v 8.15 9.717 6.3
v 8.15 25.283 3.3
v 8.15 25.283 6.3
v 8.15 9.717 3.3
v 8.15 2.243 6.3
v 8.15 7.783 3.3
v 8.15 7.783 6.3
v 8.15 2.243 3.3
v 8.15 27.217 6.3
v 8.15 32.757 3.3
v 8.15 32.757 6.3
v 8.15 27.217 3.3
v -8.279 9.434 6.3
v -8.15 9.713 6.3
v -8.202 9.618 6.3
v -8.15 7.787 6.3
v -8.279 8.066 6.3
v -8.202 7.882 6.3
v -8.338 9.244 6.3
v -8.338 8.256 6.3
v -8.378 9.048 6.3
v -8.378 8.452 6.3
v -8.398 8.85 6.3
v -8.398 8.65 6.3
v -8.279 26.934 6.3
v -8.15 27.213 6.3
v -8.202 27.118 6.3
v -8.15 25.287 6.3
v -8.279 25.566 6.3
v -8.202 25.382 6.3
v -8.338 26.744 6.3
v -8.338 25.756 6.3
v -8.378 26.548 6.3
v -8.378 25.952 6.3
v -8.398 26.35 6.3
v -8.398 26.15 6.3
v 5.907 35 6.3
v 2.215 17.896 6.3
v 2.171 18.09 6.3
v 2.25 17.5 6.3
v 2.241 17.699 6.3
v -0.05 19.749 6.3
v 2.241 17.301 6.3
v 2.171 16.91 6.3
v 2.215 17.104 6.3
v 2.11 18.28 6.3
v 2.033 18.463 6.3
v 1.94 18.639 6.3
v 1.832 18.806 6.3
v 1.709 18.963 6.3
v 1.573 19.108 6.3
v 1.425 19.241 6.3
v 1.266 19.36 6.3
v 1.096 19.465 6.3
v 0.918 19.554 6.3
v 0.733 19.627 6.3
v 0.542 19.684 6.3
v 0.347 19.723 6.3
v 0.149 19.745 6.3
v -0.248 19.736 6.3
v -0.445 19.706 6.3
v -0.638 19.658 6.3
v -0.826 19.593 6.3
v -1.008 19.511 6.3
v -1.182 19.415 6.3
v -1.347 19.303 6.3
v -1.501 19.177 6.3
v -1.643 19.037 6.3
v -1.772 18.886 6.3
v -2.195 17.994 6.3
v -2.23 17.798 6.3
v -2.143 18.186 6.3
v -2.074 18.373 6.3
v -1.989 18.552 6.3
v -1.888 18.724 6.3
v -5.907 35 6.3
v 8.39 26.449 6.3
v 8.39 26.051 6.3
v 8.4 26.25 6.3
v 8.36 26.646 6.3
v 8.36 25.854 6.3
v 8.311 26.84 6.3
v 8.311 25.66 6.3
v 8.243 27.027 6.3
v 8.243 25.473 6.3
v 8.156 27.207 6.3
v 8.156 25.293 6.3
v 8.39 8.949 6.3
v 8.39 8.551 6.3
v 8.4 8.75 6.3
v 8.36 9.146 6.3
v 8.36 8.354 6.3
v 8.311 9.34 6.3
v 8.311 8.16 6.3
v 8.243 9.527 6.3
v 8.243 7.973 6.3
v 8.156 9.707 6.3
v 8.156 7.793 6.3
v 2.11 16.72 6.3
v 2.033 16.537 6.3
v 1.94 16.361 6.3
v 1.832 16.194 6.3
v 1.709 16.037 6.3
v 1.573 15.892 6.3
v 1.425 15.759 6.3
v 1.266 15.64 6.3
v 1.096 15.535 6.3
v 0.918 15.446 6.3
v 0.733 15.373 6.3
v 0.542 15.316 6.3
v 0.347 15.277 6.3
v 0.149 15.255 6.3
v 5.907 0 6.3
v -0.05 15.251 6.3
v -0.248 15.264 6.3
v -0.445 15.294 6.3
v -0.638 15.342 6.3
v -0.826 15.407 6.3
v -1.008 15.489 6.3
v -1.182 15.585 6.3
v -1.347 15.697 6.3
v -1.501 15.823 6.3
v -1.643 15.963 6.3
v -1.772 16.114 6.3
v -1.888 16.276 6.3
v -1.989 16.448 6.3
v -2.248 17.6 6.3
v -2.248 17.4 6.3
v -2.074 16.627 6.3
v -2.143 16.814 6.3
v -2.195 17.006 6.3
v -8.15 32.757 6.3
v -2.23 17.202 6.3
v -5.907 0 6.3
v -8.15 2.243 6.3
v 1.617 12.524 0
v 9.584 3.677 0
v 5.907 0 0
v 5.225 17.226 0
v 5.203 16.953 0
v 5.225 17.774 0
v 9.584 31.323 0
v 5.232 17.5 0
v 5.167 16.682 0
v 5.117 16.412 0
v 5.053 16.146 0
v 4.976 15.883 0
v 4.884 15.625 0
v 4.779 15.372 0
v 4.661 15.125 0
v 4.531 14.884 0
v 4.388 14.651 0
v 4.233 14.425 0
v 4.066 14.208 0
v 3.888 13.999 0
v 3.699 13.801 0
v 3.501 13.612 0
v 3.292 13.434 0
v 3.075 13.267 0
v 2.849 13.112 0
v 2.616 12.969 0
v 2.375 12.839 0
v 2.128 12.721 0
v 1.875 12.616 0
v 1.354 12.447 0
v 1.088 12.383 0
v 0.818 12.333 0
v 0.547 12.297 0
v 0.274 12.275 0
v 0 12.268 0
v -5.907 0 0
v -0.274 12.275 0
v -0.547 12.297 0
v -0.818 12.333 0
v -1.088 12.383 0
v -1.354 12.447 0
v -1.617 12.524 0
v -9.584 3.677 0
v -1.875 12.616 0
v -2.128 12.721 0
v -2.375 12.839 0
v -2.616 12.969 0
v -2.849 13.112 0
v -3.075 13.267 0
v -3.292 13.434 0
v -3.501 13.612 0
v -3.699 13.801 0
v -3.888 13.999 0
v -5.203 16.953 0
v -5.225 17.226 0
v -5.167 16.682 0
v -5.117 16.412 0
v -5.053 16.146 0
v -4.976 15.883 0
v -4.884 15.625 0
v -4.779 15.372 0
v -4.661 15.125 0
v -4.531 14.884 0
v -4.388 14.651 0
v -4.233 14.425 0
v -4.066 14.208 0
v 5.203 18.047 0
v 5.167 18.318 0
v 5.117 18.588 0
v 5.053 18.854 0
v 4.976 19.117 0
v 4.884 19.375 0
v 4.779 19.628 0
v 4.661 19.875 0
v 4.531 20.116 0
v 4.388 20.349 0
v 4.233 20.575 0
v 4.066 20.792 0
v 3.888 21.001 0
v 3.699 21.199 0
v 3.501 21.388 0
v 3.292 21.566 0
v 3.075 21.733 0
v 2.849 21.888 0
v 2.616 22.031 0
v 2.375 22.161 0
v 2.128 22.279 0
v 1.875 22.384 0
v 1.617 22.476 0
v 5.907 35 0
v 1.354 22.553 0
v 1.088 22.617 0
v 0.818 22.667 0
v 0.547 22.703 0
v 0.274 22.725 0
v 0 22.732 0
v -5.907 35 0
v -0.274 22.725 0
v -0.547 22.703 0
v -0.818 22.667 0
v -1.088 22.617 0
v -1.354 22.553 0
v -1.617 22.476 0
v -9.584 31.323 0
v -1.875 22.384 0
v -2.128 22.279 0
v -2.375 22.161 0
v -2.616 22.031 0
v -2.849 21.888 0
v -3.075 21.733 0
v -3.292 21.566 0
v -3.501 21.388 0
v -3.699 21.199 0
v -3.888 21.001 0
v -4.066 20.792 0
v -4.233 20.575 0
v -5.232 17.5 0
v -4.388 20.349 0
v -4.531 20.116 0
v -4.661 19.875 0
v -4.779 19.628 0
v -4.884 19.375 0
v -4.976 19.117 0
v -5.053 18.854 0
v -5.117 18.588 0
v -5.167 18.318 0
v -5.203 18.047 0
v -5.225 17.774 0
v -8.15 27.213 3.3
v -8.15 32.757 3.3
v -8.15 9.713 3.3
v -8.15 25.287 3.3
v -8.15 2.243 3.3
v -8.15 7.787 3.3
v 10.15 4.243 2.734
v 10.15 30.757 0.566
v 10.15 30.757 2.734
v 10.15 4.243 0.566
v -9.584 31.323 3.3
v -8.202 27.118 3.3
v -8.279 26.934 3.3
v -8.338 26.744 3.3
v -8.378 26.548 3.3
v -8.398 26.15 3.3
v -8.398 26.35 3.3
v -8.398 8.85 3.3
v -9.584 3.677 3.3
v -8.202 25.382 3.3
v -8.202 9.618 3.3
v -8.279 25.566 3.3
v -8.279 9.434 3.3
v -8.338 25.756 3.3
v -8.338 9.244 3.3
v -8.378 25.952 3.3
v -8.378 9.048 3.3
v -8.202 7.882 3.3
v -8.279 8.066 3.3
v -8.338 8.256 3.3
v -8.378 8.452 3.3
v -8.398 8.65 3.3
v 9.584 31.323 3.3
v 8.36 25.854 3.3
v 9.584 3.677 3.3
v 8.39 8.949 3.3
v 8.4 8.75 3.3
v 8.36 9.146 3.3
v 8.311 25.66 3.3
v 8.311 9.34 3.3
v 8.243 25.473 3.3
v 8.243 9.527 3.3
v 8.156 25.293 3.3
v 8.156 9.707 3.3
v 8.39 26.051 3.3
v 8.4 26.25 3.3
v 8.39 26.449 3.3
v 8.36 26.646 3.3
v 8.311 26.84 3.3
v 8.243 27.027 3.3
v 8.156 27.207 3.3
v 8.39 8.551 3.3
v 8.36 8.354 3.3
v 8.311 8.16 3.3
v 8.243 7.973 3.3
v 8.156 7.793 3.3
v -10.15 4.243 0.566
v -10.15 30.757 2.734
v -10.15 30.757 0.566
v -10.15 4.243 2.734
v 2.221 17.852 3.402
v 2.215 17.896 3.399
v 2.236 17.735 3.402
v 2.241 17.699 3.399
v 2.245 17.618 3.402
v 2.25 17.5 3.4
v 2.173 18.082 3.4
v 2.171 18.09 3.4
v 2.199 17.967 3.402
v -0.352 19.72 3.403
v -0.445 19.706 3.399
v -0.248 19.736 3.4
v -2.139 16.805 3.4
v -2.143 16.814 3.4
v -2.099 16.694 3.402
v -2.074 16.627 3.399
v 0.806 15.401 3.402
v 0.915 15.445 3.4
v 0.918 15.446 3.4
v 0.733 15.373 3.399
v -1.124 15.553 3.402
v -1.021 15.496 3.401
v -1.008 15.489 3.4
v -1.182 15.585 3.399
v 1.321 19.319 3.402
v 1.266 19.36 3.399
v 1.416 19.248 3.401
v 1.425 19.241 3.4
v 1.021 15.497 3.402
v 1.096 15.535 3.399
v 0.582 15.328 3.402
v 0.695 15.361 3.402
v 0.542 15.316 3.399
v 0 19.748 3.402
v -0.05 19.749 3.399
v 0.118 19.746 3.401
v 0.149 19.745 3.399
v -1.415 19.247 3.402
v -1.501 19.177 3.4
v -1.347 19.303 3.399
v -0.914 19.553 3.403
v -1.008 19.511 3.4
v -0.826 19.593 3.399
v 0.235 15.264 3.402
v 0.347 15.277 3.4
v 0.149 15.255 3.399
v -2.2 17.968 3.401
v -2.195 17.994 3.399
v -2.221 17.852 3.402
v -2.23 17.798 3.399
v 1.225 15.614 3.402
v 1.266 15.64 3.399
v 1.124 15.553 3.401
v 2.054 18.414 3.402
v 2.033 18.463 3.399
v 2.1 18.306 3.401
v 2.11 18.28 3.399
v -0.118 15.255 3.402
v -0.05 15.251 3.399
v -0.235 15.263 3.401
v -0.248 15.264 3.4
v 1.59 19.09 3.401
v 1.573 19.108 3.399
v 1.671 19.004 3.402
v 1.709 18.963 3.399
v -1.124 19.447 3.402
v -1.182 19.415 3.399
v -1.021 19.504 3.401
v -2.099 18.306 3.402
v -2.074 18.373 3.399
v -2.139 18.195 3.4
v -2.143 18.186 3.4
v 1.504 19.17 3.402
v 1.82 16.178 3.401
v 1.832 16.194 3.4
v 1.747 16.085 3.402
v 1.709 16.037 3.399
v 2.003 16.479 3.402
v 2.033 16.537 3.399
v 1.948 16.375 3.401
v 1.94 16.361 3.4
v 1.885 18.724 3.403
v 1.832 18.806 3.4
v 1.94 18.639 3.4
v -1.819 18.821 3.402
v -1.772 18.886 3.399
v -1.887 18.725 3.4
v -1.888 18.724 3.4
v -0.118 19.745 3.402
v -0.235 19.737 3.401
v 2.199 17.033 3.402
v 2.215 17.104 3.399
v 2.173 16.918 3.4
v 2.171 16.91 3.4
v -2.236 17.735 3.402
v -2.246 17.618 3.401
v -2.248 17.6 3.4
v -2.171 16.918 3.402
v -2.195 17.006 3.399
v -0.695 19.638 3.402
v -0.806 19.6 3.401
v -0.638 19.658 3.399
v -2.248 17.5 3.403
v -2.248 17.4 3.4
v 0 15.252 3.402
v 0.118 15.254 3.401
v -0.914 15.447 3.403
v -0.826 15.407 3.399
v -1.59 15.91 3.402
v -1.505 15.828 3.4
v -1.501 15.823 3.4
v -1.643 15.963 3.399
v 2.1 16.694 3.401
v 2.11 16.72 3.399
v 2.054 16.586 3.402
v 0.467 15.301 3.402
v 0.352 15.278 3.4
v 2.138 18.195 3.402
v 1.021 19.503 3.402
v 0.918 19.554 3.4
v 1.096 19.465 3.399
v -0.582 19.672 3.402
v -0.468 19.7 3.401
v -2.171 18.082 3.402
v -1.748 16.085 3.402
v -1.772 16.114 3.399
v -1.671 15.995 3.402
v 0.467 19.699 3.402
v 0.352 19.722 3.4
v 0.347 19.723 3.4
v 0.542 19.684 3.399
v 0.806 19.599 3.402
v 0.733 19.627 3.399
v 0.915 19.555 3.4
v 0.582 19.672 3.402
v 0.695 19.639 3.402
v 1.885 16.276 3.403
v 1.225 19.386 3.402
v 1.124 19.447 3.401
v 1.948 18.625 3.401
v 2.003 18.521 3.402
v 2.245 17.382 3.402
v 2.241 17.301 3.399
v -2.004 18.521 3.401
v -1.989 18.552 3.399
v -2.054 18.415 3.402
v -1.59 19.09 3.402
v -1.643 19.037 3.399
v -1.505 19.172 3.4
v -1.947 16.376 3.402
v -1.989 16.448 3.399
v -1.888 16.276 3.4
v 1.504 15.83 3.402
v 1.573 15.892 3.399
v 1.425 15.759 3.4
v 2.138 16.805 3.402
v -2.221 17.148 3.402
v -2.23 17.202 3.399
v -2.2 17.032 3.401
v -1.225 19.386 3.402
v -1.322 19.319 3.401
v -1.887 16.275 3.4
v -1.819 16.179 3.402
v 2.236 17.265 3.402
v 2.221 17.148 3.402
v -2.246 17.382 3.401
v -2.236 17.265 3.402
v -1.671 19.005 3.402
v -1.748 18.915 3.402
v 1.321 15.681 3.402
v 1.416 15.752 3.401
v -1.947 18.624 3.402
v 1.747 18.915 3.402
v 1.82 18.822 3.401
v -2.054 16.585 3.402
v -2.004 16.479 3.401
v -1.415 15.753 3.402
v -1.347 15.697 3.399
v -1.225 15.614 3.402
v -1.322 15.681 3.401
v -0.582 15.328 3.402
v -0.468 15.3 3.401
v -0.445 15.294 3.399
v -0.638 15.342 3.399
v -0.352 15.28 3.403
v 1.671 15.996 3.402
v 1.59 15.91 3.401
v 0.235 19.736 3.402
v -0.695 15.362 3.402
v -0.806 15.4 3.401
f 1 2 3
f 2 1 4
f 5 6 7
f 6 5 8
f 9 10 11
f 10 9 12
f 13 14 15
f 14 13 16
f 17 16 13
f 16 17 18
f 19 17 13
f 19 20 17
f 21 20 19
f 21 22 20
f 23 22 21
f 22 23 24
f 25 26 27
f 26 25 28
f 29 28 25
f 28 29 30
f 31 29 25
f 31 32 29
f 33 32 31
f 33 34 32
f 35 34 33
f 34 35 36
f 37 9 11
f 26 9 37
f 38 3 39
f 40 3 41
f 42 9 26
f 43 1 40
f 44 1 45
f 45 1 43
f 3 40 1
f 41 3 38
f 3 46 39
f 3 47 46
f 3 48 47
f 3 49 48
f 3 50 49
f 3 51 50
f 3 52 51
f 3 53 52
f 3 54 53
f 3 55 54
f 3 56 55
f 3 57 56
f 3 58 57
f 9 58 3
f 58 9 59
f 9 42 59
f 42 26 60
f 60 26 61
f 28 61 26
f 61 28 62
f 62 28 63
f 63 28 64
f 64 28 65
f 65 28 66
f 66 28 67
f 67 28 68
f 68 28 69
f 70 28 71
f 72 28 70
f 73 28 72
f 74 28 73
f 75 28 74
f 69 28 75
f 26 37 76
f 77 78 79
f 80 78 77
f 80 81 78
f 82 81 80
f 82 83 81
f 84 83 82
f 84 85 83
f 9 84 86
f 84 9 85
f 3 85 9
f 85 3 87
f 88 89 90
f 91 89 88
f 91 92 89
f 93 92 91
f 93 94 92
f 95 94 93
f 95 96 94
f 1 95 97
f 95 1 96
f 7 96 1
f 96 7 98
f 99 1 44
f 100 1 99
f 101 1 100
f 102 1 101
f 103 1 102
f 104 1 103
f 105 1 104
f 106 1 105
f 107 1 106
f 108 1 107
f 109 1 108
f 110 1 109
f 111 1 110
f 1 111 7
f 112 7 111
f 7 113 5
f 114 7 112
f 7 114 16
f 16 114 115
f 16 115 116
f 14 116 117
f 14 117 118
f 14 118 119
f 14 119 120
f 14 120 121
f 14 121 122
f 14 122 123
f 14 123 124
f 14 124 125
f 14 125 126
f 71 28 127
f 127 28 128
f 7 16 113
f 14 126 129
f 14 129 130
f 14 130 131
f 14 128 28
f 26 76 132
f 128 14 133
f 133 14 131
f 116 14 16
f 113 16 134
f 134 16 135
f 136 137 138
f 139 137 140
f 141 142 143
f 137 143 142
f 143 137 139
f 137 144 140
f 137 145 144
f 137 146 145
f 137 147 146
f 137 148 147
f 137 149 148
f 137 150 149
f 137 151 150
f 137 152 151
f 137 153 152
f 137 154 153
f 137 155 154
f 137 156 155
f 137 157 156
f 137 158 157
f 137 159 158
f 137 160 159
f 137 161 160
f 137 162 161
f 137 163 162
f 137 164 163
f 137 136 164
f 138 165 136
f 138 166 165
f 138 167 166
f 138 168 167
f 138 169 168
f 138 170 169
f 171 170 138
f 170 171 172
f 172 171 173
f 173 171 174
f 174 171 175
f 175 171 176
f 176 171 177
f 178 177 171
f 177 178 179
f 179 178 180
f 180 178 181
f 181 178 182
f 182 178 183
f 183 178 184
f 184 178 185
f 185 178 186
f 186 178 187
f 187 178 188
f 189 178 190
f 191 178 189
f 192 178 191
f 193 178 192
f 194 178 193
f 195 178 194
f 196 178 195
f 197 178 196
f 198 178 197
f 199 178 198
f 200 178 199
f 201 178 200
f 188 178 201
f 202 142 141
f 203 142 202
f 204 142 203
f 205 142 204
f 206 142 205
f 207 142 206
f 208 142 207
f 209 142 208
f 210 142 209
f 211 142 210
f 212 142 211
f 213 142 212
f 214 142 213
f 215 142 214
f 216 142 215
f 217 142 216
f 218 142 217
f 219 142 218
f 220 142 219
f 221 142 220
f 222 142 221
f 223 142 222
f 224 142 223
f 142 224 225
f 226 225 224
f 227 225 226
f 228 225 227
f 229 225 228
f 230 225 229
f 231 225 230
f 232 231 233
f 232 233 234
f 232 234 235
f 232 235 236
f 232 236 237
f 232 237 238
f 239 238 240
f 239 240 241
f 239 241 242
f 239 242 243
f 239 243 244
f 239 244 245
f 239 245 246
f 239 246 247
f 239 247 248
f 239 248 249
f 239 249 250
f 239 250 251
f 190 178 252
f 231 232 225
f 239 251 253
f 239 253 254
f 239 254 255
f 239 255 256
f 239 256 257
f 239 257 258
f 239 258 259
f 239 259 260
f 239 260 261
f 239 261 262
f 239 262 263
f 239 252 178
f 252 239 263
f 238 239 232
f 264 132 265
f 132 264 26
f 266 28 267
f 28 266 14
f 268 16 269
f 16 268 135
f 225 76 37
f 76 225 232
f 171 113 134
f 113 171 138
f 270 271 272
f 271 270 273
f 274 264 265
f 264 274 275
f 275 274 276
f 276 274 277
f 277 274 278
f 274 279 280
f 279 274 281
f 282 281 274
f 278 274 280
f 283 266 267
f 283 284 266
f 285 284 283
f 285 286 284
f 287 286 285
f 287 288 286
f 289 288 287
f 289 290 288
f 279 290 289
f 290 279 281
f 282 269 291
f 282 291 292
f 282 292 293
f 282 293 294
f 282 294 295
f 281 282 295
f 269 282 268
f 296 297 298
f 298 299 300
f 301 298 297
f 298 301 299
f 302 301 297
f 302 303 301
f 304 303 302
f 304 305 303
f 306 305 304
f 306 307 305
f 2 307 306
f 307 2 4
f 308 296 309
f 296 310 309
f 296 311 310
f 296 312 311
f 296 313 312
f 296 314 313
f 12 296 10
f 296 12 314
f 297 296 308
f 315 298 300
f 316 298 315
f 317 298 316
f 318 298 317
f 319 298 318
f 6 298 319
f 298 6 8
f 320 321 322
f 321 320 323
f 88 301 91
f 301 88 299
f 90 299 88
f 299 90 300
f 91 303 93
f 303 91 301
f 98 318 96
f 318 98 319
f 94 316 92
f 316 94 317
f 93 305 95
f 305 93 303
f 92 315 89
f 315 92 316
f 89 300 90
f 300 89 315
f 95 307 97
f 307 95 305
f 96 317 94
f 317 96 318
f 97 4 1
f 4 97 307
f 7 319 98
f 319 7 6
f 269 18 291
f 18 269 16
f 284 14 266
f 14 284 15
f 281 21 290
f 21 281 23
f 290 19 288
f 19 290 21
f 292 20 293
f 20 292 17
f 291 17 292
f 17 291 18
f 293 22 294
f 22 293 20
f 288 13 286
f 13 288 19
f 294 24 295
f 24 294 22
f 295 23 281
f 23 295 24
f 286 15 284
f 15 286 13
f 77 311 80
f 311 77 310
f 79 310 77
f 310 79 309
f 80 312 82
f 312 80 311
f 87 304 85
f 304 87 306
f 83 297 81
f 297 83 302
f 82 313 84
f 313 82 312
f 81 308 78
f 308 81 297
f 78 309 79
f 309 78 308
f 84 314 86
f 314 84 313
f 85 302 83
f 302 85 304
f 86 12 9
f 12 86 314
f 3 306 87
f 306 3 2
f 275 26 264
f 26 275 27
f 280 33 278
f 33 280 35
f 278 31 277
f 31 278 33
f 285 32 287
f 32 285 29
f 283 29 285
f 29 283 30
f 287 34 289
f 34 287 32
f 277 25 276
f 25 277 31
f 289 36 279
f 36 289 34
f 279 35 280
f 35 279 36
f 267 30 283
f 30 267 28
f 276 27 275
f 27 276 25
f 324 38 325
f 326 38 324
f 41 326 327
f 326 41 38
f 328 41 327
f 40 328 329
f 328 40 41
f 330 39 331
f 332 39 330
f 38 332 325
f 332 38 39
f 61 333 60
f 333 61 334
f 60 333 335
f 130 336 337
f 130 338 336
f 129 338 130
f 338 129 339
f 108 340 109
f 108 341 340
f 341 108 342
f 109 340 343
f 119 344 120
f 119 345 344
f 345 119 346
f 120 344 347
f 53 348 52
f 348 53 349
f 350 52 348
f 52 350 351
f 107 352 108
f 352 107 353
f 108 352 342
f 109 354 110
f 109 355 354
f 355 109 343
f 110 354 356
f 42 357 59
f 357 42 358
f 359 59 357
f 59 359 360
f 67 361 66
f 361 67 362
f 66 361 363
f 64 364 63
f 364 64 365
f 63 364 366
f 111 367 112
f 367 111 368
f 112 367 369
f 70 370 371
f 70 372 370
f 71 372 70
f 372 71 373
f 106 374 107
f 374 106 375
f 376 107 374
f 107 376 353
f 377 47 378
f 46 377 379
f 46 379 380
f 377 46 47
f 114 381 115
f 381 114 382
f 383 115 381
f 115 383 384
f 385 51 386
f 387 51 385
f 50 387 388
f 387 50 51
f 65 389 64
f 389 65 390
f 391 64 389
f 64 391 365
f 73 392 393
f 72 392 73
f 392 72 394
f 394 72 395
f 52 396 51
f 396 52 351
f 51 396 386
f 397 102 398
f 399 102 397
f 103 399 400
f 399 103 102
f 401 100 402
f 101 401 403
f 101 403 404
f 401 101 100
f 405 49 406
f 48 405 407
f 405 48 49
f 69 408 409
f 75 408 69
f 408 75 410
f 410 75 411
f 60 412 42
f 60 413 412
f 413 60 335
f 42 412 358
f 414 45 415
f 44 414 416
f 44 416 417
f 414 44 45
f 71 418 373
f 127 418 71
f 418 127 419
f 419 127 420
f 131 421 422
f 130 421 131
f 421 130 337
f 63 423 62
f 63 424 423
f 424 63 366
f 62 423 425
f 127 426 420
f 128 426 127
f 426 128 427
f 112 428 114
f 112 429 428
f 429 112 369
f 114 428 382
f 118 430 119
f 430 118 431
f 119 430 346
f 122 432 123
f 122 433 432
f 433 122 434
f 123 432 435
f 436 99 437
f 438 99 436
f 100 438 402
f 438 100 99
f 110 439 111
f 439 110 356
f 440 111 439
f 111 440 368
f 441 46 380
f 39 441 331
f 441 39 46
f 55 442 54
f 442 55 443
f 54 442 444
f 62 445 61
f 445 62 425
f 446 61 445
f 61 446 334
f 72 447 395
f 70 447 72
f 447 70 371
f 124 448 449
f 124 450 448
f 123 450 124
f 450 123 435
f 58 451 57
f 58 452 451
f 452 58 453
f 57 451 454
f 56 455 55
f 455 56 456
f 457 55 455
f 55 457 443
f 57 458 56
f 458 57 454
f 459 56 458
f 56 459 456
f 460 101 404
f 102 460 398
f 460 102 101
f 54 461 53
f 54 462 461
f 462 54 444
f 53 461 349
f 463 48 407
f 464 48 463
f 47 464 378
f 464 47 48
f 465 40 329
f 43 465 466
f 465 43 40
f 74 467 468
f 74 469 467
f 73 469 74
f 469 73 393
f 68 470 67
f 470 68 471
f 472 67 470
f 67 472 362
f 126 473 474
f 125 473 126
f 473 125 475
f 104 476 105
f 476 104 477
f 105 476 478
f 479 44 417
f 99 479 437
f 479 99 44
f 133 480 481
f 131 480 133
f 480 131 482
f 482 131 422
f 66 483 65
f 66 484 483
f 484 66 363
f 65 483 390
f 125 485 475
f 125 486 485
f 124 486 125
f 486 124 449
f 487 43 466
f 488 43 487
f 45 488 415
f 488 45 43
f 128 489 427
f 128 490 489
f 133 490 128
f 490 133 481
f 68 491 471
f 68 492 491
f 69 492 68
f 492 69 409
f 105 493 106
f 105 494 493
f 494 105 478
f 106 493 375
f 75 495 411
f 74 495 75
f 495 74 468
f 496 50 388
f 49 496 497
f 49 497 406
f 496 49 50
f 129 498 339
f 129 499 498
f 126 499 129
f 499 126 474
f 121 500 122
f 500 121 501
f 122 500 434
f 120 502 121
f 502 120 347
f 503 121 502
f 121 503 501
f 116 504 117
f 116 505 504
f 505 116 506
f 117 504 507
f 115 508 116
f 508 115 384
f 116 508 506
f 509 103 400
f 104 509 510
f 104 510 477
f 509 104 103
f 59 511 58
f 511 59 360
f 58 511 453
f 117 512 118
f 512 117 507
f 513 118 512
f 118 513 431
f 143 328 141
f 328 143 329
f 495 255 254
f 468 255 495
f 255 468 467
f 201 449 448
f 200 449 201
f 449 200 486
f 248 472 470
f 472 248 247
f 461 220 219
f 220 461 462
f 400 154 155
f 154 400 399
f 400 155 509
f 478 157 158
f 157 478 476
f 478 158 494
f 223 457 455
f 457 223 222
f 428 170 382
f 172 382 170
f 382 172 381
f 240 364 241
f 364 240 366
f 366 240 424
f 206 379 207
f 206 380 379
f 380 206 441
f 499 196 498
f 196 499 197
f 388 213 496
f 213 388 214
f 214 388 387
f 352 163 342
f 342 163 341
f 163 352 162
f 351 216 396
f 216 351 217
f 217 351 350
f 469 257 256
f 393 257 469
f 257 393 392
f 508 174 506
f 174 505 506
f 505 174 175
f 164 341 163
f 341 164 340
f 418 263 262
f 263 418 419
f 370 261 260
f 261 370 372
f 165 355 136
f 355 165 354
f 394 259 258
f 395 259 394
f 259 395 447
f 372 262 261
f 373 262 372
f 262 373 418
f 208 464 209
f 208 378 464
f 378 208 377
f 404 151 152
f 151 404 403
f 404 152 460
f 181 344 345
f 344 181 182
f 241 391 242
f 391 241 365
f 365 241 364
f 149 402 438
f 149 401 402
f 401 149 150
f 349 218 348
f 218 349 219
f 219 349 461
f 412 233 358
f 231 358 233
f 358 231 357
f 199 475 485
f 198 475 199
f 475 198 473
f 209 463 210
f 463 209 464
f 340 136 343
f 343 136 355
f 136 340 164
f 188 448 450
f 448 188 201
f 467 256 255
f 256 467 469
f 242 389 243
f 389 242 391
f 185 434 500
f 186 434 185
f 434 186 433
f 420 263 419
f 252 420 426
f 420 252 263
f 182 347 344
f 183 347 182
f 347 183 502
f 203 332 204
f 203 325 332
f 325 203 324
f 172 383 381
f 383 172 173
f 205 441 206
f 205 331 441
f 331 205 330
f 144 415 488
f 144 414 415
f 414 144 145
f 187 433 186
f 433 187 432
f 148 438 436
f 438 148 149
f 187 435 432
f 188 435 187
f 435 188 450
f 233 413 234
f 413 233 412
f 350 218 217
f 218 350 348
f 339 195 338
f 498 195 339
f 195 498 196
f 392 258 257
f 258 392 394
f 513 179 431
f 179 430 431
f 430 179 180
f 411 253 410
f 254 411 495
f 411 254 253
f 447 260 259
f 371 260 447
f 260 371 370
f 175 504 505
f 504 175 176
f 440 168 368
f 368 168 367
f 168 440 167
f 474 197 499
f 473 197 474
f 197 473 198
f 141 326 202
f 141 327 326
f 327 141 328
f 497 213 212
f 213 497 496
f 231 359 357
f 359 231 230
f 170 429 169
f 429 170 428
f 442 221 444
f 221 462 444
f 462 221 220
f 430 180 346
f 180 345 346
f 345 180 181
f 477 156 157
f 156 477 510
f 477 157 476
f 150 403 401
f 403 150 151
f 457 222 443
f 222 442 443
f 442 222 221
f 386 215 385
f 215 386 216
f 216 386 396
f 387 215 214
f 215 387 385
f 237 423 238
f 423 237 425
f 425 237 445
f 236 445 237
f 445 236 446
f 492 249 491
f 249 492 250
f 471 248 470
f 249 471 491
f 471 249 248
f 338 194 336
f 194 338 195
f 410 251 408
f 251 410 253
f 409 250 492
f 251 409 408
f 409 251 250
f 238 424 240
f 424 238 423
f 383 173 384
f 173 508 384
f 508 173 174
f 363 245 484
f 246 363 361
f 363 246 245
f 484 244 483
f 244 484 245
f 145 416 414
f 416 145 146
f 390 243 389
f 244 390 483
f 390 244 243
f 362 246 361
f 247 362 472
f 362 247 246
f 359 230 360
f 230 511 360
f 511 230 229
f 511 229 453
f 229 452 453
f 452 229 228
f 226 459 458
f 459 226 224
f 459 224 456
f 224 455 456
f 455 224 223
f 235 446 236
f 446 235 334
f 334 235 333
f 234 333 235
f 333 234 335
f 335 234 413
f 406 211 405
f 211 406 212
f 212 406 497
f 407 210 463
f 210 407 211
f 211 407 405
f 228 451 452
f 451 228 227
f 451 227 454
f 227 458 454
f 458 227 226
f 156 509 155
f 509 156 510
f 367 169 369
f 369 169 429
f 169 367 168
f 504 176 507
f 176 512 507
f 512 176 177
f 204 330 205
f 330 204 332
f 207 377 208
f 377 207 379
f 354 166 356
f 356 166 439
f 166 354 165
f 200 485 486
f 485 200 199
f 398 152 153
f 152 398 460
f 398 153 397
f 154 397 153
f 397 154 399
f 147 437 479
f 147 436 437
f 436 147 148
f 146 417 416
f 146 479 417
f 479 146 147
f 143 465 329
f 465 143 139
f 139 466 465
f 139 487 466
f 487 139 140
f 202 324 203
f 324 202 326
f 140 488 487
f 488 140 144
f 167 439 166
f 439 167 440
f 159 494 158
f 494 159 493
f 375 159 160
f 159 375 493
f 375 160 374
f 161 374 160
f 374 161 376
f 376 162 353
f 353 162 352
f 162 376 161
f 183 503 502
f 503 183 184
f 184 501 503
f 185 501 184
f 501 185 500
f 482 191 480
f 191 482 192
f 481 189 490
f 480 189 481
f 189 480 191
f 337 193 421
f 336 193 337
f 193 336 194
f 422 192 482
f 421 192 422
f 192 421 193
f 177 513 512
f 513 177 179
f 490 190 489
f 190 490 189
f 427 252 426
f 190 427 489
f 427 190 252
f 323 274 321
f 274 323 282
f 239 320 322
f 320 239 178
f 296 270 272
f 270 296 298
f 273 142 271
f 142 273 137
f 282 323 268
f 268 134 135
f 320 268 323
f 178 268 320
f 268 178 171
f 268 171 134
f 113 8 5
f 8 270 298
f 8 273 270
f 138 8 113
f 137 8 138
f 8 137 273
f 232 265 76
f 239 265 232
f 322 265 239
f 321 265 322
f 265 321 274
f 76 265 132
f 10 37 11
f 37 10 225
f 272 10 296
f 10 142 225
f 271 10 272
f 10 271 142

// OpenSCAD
// Copyright 2018 Geoff Sobering - All Rights Reserved
//
// This design is licensed under the Creative Commons
//   Attribution-NonCommercial-ShareAlike 3.0 Unported License
//  (CC BY-NC-SA 3.0)
//  https://creativecommons.org/licenses/by-nc-sa/3.0/
//  https://creativecommons.org/licenses/by-nc-sa/3.0/legalcode
//
// For commerical use, please contact us (geoff@geoffs.net).

$fa = 3;
$fs = 0.2;

//         <------ A ---->
//
//         +-------------+         ^
//         |             |         |
//      +--+             +--+  ^   D
//      |                   |  C   |
//      +-------------------+  v  v
//
//      <------- B  -------->

length = 35;
A = 16.3;
Ab = A + 0.5;
B = 20.3;
C = 3.3;
D = 6.3;

// #8 Flat-Head screw:
screHoleDia = 4.5;
headAngle = 82.5;
headDepth = 3.4;

AbDia = 4;
AbPos = length * 0.25;
chamfer_xz = 0.4;
chamfer_xy = 3;

baseCountersinkInset = (screHoleDia/2)/tan(headAngle/2);

difference()
{
  union()
  {
    translate([-A/2, 0, 0]) cube([A, length, D]);
    translate([-B/2, 0, 0]) cube([B, length, C]);
    Abump(1, 0, 1);
    Abump(-1, 0, 1);
    Abump(1, length, -1);
    Abump(-1, length, -1);
  }

  chamfer_xz(-B/2, C, 45, chamfer_xz);
  chamfer_xz(-B/2, 0, -45, chamfer_xz);
  chamfer_xz(B/2, C, 135, chamfer_xz);
  chamfer_xz(B/2, 0, -135, chamfer_xz);

  chamfer_xy(-B/2, 0, 45, chamfer_xy);
  chamfer_xy( B/2, 0, 135, chamfer_xy);
  chamfer_xy(-B/2, length, -45, chamfer_xy);
  chamfer_xy( B/2, length, -135, chamfer_xy);

  translate([0, length/2, 0])
  {
    coneDepth = 10;
    coneDia = 2*tan(headAngle/2)*coneDepth;
    translate([0, 0, -1]) cylinder(d=screHoleDia, h=20);
    translate([0,0,-coneDepth+baseCountersinkInset+headDepth]) cylinder(d2=0, d1=coneDia, h=coneDepth);
  }
}

module Abump(xs, y, ys)
{

  translate([xs*(Ab-AbDia)/2, y+ys*AbPos, 0]) cylinder(d=AbDia, h=D);
}

module chamfer_xz(dx, dz, a, chamfer)
{
    translate([dx, 0, dz]) rotate(a, [0,1,0]) translate([-2+chamfer, -1, -1-chamfer/2]) cube([2, length+2, 2]);
}

module chamfer_xy(dx, dy, a, chamfer)
{
    translate([dx, dy, 0]) rotate(a, [0,0,1]) translate([-8+chamfer, -4, -1]) cube([8, 8, D+2]);
}
